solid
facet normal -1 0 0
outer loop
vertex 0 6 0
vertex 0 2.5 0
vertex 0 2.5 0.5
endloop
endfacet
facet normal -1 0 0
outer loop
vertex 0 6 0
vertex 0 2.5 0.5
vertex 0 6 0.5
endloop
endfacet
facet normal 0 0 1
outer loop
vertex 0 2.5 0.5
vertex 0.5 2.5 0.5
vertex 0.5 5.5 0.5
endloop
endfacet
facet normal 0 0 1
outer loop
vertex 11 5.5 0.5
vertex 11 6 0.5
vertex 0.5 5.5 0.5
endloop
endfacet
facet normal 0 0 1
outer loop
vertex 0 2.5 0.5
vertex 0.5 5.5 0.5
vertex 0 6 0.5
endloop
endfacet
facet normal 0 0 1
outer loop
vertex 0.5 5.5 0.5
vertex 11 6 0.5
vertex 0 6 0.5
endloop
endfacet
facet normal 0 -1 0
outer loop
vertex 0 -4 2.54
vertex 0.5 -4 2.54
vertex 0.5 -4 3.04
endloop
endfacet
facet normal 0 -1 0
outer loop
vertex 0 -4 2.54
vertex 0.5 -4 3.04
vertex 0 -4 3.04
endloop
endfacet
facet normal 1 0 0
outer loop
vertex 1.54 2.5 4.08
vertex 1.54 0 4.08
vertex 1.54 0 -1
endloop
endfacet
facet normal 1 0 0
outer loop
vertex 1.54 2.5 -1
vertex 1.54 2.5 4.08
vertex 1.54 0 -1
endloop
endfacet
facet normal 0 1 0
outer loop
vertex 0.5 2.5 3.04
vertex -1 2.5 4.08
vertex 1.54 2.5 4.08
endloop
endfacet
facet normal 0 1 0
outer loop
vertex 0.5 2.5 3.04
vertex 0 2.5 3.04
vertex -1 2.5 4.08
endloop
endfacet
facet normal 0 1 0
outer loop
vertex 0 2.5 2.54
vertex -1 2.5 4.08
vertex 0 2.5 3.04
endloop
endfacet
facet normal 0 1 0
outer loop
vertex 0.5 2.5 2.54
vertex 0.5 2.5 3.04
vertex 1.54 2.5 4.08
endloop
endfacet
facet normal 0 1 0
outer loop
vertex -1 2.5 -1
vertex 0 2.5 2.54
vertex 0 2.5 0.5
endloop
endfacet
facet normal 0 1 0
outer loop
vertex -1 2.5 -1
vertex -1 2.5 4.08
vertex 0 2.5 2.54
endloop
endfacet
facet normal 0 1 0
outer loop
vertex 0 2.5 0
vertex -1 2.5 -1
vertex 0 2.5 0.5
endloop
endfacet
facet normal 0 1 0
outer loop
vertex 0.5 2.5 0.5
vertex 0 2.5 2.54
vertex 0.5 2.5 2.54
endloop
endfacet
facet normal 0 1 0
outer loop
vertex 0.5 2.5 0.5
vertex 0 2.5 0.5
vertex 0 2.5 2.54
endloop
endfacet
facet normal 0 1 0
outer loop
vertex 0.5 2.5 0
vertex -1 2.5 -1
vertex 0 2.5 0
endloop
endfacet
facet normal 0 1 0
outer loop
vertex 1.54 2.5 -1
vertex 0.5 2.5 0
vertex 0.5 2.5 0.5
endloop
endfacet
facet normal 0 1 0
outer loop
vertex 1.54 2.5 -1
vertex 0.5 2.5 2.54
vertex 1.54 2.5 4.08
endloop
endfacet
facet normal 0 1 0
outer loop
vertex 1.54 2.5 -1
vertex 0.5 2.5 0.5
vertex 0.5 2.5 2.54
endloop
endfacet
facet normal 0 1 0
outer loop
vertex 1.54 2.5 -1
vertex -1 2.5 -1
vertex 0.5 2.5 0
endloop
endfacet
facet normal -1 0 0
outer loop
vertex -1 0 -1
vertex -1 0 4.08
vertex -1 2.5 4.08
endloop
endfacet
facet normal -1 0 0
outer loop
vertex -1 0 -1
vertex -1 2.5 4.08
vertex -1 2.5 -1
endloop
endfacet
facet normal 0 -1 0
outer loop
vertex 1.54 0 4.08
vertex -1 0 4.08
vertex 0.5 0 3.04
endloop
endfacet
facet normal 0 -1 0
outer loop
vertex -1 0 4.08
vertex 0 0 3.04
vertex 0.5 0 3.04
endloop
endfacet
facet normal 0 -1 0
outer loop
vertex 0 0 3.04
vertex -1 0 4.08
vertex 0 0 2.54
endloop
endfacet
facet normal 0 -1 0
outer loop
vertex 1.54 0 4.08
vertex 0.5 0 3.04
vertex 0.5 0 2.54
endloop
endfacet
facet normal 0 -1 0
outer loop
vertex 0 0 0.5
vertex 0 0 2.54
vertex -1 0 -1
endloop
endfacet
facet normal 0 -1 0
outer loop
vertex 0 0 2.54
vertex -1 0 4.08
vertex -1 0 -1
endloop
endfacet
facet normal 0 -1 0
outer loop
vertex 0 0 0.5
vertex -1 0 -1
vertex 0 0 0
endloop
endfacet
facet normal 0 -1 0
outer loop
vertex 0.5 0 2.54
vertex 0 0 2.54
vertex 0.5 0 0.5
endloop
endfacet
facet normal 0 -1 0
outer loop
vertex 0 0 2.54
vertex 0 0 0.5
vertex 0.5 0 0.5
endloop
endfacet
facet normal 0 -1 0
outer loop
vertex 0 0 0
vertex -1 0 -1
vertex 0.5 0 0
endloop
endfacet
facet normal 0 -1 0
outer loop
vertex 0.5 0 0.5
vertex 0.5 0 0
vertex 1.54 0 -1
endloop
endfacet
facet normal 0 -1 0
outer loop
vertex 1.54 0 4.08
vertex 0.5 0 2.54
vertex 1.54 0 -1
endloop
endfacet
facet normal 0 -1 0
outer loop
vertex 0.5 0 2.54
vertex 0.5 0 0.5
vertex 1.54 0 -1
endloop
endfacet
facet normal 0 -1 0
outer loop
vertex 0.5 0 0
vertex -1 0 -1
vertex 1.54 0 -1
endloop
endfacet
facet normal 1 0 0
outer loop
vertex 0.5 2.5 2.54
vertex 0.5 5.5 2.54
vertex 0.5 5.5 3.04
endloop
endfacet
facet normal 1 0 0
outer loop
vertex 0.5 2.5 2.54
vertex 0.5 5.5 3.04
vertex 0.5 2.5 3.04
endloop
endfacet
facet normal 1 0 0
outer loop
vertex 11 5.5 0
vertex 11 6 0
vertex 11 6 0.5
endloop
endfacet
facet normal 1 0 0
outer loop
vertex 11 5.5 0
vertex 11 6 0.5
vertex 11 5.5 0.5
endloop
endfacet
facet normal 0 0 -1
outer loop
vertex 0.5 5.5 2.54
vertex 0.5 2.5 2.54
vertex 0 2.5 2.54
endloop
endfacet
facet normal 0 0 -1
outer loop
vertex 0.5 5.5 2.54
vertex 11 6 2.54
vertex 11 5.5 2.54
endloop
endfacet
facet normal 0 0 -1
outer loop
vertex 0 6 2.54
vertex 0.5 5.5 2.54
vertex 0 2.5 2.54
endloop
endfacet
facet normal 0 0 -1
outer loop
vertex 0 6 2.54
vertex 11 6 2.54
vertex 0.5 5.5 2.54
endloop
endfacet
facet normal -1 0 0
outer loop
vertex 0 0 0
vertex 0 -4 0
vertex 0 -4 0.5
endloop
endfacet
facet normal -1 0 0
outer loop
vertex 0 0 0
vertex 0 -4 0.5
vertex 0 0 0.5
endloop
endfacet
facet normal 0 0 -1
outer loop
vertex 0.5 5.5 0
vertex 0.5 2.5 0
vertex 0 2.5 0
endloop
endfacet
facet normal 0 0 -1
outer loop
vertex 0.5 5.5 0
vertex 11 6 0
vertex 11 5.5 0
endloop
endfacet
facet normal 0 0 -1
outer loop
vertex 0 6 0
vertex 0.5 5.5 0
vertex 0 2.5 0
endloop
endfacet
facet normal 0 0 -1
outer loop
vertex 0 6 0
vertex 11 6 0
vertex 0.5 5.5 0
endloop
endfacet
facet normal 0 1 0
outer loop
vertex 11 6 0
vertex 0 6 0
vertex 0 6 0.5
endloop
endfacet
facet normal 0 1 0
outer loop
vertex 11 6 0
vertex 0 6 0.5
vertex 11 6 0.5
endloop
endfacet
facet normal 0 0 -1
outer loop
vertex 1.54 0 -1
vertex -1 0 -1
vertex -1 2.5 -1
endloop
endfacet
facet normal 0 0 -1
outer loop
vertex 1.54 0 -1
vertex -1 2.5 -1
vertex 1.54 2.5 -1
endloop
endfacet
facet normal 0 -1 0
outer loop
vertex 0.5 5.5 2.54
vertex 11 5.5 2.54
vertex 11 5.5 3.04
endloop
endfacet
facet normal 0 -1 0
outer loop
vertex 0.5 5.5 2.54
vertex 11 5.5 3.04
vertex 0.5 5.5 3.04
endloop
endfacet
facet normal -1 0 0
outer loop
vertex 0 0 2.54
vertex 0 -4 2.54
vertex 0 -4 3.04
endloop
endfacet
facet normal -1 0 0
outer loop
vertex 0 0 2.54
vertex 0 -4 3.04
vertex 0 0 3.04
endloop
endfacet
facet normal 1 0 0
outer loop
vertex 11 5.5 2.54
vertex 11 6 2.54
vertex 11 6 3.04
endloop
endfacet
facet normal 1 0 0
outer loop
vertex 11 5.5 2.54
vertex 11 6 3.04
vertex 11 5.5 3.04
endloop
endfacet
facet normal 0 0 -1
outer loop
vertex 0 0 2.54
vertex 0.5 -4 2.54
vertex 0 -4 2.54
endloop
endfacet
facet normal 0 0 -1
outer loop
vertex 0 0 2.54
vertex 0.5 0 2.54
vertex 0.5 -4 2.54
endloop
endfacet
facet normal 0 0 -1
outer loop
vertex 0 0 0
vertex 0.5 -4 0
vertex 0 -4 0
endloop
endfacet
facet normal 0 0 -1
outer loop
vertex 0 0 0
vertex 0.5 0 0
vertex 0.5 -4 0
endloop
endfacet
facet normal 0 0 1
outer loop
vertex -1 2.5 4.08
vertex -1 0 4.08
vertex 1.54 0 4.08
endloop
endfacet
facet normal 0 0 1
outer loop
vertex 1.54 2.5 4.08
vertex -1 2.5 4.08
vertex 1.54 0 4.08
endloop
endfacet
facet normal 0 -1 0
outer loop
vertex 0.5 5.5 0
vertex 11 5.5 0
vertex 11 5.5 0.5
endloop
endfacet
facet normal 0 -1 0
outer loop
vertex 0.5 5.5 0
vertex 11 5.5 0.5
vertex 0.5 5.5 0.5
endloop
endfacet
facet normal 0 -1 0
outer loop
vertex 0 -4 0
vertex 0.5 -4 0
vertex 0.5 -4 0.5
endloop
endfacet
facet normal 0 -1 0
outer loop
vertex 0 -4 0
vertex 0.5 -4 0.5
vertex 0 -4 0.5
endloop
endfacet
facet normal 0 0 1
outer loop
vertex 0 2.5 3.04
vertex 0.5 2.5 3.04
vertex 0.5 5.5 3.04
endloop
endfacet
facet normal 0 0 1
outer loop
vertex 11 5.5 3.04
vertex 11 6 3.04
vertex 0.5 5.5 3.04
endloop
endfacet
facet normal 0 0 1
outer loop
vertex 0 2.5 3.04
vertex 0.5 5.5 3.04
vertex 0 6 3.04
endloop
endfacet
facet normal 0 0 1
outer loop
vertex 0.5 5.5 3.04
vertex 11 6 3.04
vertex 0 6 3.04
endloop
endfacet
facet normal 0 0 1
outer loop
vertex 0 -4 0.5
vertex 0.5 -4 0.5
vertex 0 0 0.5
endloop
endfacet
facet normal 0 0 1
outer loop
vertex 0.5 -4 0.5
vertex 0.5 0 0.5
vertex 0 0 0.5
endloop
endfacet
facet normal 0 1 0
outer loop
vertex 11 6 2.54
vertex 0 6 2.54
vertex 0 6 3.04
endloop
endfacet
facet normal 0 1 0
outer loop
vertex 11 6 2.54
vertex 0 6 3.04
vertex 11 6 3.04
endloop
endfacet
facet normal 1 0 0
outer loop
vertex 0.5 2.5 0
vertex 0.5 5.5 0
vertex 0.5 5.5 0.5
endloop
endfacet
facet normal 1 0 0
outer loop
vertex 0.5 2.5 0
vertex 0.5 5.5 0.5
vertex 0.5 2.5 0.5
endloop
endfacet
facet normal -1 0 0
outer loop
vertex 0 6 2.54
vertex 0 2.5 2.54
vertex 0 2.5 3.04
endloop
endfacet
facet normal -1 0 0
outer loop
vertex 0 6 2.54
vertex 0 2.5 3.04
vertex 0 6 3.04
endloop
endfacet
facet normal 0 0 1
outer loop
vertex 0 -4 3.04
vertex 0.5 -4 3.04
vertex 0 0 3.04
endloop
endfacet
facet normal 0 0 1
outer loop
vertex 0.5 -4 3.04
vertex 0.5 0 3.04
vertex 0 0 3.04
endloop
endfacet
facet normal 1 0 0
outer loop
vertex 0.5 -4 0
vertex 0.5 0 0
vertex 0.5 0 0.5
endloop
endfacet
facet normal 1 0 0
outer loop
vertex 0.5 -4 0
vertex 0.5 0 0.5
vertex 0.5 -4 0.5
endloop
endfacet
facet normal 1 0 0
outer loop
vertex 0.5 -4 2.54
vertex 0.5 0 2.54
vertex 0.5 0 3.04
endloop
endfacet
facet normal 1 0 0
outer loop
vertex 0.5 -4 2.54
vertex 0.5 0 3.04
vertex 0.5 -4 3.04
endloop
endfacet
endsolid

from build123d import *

# Parameters (mm, degrees)
BOSS_EXTRU_1_DEPTH         = 0.5
ESQUISSE2_W                = 2.54
ESQUISSE2_H                = 2.54
BOSS_EXTRU_2_DEPTH         = 2.5
R_P_TITION_LIN_AIRE3_COUNT = 2
R_P_TITION_LIN_AIRE3_PITCH = 2.54


with BuildPart() as part:
    # Esquisse1 → Boss.-Extru.1 (new body)
    with BuildSketch(Plane.XY):
        Polygon((0, -4), (0, 6), (11, 6), (11, 5.5), (0.5, 5.5), (0.5, -4), align=None)
    boss_extru_1 = extrude(amount=BOSS_EXTRU_1_DEPTH)

    # Esquisse2 → Boss.-Extru.2 (add)
    with BuildSketch(Plane(origin=(0, 0, 0), x_dir=(1, 0, 0), z_dir=(0, 1, 0))):
        with Locations((0.27, -0.27)):
            Rectangle(ESQUISSE2_W, ESQUISSE2_H)
    boss_extru_2 = extrude(amount=BOSS_EXTRU_2_DEPTH)

    # Répétition linéaire3: Boss.-Extru.1, Boss.-Extru.2 ×2
    with Locations(*[(0, 0, i * R_P_TITION_LIN_AIRE3_PITCH) for i in range(1, R_P_TITION_LIN_AIRE3_COUNT)]):
        add(boss_extru_1)
        add(boss_extru_2)


solid = part.part
